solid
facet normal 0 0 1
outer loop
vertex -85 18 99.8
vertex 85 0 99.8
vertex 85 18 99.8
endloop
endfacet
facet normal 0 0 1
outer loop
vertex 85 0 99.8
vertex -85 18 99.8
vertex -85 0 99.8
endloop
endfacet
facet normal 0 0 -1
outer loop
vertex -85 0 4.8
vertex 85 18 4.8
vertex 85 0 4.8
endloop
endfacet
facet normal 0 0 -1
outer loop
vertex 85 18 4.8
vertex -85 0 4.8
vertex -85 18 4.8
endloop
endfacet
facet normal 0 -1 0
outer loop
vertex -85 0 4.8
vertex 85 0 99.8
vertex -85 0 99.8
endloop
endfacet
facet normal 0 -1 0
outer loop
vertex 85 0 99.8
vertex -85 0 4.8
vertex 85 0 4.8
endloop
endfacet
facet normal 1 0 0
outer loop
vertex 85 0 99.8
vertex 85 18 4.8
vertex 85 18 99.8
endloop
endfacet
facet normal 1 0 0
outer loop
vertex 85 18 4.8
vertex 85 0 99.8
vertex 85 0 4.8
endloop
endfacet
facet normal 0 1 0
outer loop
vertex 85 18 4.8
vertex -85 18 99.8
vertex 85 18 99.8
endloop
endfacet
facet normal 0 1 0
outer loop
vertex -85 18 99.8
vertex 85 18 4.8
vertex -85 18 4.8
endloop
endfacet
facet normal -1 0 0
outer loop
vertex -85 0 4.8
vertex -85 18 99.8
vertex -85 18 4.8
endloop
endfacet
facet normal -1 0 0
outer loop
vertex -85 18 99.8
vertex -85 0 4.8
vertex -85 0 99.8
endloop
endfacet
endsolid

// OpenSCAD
// file: common.scad
// Wspolna geometria. Uklad druku: mostek na Z=0, szczeliny otwarte ku +Z.
// W uzyciu nasadke odwraca sie: mostek lezy na gornych krawedziach plyt.
function choose(v,a,b,c) = v=="standard" ? a : v=="reinforced" ? b : c;
function al() = arm_length>0 ? arm_length : choose(variant,70,72,52);
function wt() = wall_thickness>0 ? wall_thickness : choose(variant,5,6,4.4);
function bh() = body_height>0 ? body_height : choose(variant,24,28,20);
function bt() = base_thickness>0 ? base_thickness : choose(variant,3.6,4.8,3.2);
function gh() = guide_height>0 ? guide_height : choose(variant,58,62,52);
function gs() = reinforcement_size>0 ? reinforcement_size : choose(variant,11,17,7);
function rd() = variant=="reinforced" ? 2.4 : 0;
function margin() = wt()+rd();
function slot() = board_thickness+clearance;
function tw() = max(board_thickness,guide_hole_diameter+2*wt());
function top_hole() = bt()+guide_first_offset+(guide_hole_count-1)*guide_hole_spacing;
function footprint_depth() = al()+margin();

module check_parameters() {
    assert(variant=="standard" || variant=="reinforced" || variant=="compact", "Nieznany wariant");
    assert(board_thickness>=12 && clearance>=0 && clearance<=1, "Sprawdz grubosc plyty i luz");
    assert(wt()>=3.6 && bt()>=2.8 && bh()>2*lead_in, "Zbyt cienkie scianki / mostek");
    assert(lead_in>=0 && lead_in<wt()/2 && corner_radius>0 && corner_radius<wt(), "Bledny promien / faza");
    assert(al()>slot()+wt()+gs()+4, "Za krotkie ramiona dla tych parametrow");
    assert(guide_hole_diameter>0 && guide_hole_spacing>guide_hole_diameter*1.21+3, "Za maly mostek miedzy otworami");
    assert(guide_hole_count>=1 && guide_hole_count==floor(guide_hole_count), "Liczba otworow musi byc calkowita");
    assert(gh()>top_hole()+guide_hole_diameter/sqrt(2)+4 && gh()>bt()+bh(), "Za niska wieza otworow");
    assert(inspection_diameter<slot()-4, "Za duze okno kontrolne");
    children();
}

module rect(x,y,w,h) { translate([x,y]) square([w,h]); }

// Erozja i dylatacja zaokraglaja wypukle krawedzie, zachowujac gabaryt.
module rounded_outer() { offset(r=corner_radius) offset(delta=-corner_radius) children(); }

module raw_outer(kind) {
    a=al(); w=wt(); s=slot(); t=board_thickness; g=gs();
    if(kind=="TL") {
        rect(-a,-w,2*a,s+2*w);
        rect(-t/2-w,s, s+2*w,a-s);
        for(side=[-1,1]) translate([side<0 ? -t/2-w : t/2+clearance+w,s+w])
            scale([side,1]) polygon([[0,0],[g,0],[0,g]]);
    } else {
        rect(-w,-w,a+w,s+2*w);
        rect(-w,-w,s+2*w,a+w);
        translate([s+w,s+w]) polygon([[0,0],[g,0],[0,g]]);
    }
}

module outer(kind) { rounded_outer() union() raw_outer(kind); }

// Wazne: szczeliny nie sa zaokraglane do srodka. Prostokatna plyta
// moze dojsc do mostka bez kolizji z promieniem lub zebrem.
module slots_2d(kind, extra=0) {
    a=al(); s=slot(); t=board_thickness; e=1;
    offset(delta=extra) union() {
        if(kind=="TL") {
            rect(-a-e,0,2*a+2*e,s);
            rect(-t/2,t,s,a-t+e);
        } else {
            rect(0,0,a+e,s);
            rect(0,0,s,a+e);
        }
    }
}

module slot_cut(kind, height, mouth=true) {
    translate([0,0,bt()]) linear_extrude(height=height-bt()+1) slots_2d(kind);
    if(mouth && lead_in>0) {
        // Hull dwoch przekrojow daje faze bez podpory, material ubywa ku gorze.
        hull() {
            translate([0,0,height-lead_in]) linear_extrude(.01) slots_2d(kind);
            translate([0,0,height]) linear_extrude(.01) slots_2d(kind,lead_in);
        }
    }
}

module inspection(kind) {
    if(include_inspection_windows) {
        if(kind=="TL") translate([0,board_thickness/2,-1])
            cylinder(h=bt()+2,d=inspection_diameter);
        else for(axis=[0,1]) rotate([0,0,90*axis])
            // Obracamy wzgledem dodatniego naroznika przez zamiane X/Y.
            if(axis==0) hull() for(x=[board_thickness/2,al()-12])
                translate([x,board_thickness/2,-1]) cylinder(h=bt()+2,d=board_thickness/3);
            else hull() for(x=[board_thickness/2,al()-12])
                translate([x,-board_thickness/2,-1]) cylinder(h=bt()+2,d=board_thickness/3);
    }
}

module tower_one(kind) {
    x=kind=="TL" ? -tw()/2 : 0;
    // Wieza opiera sie cala dlugoscia na mostku i zewnetrznej sciance.
    translate([x,-wt(),0]) cube([tw(),wt(),gh()-2]);
    hull() {
        translate([x,-wt(),gh()-2.01]) cube([tw(),wt(),.02]);
        translate([x+2,-wt(),gh()-.02]) cube([tw()-4,wt(),.02]);
    }
    if(rd()>0) hull() {
        translate([x-2,-margin(),0]) cube([tw()+4,rd()+.02,.4]);
        translate([x,-wt()-.4,bt()+bh()-.4]) cube([tw(),.42,.4]);
    }
}

module tower(kind) {
    tower_one(kind);
    if(kind=="LL") {
        rotate([0,0,90]) mirror([0,1,0]) tower_one(kind);
        // Ciagly narozny slup: dwie wysokie scianki musza laczyc sie
        // powierzchnia, nie tylko krawedzia (wymog bryly manifold).
        linear_extrude(height=gh()) intersection() {
            rect(-wt(),-wt(),wt(),wt());
            circle(r=wt());
        }
    }
}

module hole_profile() {
    r=guide_hole_diameter/2;
    union() {
        circle(r=r);
        if(support_free_holes) polygon([[-r/sqrt(2),r/sqrt(2)],[0,r*sqrt(2)],[r/sqrt(2),r/sqrt(2)]]);
    }
}

module holes_one(kind) {
    x=kind=="TL" ? 0 : board_thickness/2;
    if(include_guide_holes) for(i=[0:guide_hole_count-1])
        translate([x,1,bt()+guide_first_offset+i*guide_hole_spacing])
            rotate([90,0,0]) linear_extrude(height=margin()+2) hole_profile();
}

module holes(kind) {
    holes_one(kind);
    if(kind=="LL") rotate([0,0,90]) mirror([0,1,0]) holes_one(kind);
}

module handle(kind) {
    check_parameters() difference() {
        union() {
            difference() {
                linear_extrude(height=bt()+bh()) outer(kind);
                slot_cut(kind,bt()+bh());
            }
            difference() {
                tower(kind);
                slot_cut(kind,gh());
            }
        }
        holes(kind);
        inspection(kind);
    }
}

// Prawdziwe polaczenie doczolowe: plyty stykaja sie, nie przenikaja.
module board_A(kind, length=85, height=95, thickness=board_thickness) {
    t=thickness;
    translate([kind=="TL" ? -length : 0,0,bt()])
        cube([kind=="TL" ? 2*length : length,t,height]);
}
module board_B(kind, length=85, height=95, thickness=board_thickness) {
    t=thickness;
    translate([kind=="TL" ? -t/2 : 0,t,bt()]) cube([t,length-t,height]);
}
module boards(kind, length=85, height=95, thickness=board_thickness) {
    board_A(kind,length,height,thickness);
    board_B(kind,length,height,thickness);
}

module fit_coupon(c=fit_clearance) {
    w=5; b=3.2; h=20; s=board_thickness+c; length=24;
    difference() {
        union() {
            translate([0,-w,0]) cube([length,s+2*w,b+h]);
            translate([length-.1,-w,0]) cube([15.1,8,b]);
        }
        translate([-1,0,b]) cube([length+2,s,h+1]);
        if(lead_in>0) hull() {
            translate([-1,0,b+h-lead_in]) cube([length+2,s,.01]);
            translate([-1,-lead_in,b+h]) cube([length+2,s+2*lead_in,.01]);
        }
        translate([31.5,-1,b-.7]) linear_extrude(1)
            text(str(c),size=4,halign="center",valign="center",font="Liberation Sans:style=Bold");
    }
}
// file: config.scad
// Wszystkie wymiary w mm. 0 = wartosc dobrana dla wariantu.
variant = "reinforced"; // [standard,reinforced,compact]
board_thickness = 18;
clearance = 0.3;        // CALKOWITY luz; szczelina = t + clearance
arm_length = 0;        // LL: dlugosc kazdego ramienia; TL: polowa poprzeczki
wall_thickness = 0;
body_height = 0;       // wysokosc chwytu ponad mostkiem, bez wiezy otworow
base_thickness = 0;
guide_height = 0;      // calkowita wysokosc modelu od stolu
corner_radius = 3;     // zewnetrzne zaokraglenia XY
reinforcement_size = 0;
lead_in = 0.6;         // faza 45 stopni przy wlocie
guide_hole_diameter = 6.65;
guide_hole_spacing = 15;
guide_first_offset = 10; // od powierzchni mostka, os pierwszego otworu
guide_hole_count = 3;
include_guide_holes = true;
support_free_holes = true; // okrag wpisany + daszek 45 stopni
include_inspection_windows = true;
inspection_diameter = 12;
plate_number = 1;       // 1 i 2: po 1 TL + 2 LL = caly zestaw
fit_clearance = 0.3;
$fn = 64;
// main file
include <config.scad>
include <common.scad>
demo_type="TL";
board_part="A";
// Tylko modele pogladowe plyt; nie sa czesciami zestawu do drukowania.
if(board_part=="A") board_A(demo_type); else board_B(demo_type);
